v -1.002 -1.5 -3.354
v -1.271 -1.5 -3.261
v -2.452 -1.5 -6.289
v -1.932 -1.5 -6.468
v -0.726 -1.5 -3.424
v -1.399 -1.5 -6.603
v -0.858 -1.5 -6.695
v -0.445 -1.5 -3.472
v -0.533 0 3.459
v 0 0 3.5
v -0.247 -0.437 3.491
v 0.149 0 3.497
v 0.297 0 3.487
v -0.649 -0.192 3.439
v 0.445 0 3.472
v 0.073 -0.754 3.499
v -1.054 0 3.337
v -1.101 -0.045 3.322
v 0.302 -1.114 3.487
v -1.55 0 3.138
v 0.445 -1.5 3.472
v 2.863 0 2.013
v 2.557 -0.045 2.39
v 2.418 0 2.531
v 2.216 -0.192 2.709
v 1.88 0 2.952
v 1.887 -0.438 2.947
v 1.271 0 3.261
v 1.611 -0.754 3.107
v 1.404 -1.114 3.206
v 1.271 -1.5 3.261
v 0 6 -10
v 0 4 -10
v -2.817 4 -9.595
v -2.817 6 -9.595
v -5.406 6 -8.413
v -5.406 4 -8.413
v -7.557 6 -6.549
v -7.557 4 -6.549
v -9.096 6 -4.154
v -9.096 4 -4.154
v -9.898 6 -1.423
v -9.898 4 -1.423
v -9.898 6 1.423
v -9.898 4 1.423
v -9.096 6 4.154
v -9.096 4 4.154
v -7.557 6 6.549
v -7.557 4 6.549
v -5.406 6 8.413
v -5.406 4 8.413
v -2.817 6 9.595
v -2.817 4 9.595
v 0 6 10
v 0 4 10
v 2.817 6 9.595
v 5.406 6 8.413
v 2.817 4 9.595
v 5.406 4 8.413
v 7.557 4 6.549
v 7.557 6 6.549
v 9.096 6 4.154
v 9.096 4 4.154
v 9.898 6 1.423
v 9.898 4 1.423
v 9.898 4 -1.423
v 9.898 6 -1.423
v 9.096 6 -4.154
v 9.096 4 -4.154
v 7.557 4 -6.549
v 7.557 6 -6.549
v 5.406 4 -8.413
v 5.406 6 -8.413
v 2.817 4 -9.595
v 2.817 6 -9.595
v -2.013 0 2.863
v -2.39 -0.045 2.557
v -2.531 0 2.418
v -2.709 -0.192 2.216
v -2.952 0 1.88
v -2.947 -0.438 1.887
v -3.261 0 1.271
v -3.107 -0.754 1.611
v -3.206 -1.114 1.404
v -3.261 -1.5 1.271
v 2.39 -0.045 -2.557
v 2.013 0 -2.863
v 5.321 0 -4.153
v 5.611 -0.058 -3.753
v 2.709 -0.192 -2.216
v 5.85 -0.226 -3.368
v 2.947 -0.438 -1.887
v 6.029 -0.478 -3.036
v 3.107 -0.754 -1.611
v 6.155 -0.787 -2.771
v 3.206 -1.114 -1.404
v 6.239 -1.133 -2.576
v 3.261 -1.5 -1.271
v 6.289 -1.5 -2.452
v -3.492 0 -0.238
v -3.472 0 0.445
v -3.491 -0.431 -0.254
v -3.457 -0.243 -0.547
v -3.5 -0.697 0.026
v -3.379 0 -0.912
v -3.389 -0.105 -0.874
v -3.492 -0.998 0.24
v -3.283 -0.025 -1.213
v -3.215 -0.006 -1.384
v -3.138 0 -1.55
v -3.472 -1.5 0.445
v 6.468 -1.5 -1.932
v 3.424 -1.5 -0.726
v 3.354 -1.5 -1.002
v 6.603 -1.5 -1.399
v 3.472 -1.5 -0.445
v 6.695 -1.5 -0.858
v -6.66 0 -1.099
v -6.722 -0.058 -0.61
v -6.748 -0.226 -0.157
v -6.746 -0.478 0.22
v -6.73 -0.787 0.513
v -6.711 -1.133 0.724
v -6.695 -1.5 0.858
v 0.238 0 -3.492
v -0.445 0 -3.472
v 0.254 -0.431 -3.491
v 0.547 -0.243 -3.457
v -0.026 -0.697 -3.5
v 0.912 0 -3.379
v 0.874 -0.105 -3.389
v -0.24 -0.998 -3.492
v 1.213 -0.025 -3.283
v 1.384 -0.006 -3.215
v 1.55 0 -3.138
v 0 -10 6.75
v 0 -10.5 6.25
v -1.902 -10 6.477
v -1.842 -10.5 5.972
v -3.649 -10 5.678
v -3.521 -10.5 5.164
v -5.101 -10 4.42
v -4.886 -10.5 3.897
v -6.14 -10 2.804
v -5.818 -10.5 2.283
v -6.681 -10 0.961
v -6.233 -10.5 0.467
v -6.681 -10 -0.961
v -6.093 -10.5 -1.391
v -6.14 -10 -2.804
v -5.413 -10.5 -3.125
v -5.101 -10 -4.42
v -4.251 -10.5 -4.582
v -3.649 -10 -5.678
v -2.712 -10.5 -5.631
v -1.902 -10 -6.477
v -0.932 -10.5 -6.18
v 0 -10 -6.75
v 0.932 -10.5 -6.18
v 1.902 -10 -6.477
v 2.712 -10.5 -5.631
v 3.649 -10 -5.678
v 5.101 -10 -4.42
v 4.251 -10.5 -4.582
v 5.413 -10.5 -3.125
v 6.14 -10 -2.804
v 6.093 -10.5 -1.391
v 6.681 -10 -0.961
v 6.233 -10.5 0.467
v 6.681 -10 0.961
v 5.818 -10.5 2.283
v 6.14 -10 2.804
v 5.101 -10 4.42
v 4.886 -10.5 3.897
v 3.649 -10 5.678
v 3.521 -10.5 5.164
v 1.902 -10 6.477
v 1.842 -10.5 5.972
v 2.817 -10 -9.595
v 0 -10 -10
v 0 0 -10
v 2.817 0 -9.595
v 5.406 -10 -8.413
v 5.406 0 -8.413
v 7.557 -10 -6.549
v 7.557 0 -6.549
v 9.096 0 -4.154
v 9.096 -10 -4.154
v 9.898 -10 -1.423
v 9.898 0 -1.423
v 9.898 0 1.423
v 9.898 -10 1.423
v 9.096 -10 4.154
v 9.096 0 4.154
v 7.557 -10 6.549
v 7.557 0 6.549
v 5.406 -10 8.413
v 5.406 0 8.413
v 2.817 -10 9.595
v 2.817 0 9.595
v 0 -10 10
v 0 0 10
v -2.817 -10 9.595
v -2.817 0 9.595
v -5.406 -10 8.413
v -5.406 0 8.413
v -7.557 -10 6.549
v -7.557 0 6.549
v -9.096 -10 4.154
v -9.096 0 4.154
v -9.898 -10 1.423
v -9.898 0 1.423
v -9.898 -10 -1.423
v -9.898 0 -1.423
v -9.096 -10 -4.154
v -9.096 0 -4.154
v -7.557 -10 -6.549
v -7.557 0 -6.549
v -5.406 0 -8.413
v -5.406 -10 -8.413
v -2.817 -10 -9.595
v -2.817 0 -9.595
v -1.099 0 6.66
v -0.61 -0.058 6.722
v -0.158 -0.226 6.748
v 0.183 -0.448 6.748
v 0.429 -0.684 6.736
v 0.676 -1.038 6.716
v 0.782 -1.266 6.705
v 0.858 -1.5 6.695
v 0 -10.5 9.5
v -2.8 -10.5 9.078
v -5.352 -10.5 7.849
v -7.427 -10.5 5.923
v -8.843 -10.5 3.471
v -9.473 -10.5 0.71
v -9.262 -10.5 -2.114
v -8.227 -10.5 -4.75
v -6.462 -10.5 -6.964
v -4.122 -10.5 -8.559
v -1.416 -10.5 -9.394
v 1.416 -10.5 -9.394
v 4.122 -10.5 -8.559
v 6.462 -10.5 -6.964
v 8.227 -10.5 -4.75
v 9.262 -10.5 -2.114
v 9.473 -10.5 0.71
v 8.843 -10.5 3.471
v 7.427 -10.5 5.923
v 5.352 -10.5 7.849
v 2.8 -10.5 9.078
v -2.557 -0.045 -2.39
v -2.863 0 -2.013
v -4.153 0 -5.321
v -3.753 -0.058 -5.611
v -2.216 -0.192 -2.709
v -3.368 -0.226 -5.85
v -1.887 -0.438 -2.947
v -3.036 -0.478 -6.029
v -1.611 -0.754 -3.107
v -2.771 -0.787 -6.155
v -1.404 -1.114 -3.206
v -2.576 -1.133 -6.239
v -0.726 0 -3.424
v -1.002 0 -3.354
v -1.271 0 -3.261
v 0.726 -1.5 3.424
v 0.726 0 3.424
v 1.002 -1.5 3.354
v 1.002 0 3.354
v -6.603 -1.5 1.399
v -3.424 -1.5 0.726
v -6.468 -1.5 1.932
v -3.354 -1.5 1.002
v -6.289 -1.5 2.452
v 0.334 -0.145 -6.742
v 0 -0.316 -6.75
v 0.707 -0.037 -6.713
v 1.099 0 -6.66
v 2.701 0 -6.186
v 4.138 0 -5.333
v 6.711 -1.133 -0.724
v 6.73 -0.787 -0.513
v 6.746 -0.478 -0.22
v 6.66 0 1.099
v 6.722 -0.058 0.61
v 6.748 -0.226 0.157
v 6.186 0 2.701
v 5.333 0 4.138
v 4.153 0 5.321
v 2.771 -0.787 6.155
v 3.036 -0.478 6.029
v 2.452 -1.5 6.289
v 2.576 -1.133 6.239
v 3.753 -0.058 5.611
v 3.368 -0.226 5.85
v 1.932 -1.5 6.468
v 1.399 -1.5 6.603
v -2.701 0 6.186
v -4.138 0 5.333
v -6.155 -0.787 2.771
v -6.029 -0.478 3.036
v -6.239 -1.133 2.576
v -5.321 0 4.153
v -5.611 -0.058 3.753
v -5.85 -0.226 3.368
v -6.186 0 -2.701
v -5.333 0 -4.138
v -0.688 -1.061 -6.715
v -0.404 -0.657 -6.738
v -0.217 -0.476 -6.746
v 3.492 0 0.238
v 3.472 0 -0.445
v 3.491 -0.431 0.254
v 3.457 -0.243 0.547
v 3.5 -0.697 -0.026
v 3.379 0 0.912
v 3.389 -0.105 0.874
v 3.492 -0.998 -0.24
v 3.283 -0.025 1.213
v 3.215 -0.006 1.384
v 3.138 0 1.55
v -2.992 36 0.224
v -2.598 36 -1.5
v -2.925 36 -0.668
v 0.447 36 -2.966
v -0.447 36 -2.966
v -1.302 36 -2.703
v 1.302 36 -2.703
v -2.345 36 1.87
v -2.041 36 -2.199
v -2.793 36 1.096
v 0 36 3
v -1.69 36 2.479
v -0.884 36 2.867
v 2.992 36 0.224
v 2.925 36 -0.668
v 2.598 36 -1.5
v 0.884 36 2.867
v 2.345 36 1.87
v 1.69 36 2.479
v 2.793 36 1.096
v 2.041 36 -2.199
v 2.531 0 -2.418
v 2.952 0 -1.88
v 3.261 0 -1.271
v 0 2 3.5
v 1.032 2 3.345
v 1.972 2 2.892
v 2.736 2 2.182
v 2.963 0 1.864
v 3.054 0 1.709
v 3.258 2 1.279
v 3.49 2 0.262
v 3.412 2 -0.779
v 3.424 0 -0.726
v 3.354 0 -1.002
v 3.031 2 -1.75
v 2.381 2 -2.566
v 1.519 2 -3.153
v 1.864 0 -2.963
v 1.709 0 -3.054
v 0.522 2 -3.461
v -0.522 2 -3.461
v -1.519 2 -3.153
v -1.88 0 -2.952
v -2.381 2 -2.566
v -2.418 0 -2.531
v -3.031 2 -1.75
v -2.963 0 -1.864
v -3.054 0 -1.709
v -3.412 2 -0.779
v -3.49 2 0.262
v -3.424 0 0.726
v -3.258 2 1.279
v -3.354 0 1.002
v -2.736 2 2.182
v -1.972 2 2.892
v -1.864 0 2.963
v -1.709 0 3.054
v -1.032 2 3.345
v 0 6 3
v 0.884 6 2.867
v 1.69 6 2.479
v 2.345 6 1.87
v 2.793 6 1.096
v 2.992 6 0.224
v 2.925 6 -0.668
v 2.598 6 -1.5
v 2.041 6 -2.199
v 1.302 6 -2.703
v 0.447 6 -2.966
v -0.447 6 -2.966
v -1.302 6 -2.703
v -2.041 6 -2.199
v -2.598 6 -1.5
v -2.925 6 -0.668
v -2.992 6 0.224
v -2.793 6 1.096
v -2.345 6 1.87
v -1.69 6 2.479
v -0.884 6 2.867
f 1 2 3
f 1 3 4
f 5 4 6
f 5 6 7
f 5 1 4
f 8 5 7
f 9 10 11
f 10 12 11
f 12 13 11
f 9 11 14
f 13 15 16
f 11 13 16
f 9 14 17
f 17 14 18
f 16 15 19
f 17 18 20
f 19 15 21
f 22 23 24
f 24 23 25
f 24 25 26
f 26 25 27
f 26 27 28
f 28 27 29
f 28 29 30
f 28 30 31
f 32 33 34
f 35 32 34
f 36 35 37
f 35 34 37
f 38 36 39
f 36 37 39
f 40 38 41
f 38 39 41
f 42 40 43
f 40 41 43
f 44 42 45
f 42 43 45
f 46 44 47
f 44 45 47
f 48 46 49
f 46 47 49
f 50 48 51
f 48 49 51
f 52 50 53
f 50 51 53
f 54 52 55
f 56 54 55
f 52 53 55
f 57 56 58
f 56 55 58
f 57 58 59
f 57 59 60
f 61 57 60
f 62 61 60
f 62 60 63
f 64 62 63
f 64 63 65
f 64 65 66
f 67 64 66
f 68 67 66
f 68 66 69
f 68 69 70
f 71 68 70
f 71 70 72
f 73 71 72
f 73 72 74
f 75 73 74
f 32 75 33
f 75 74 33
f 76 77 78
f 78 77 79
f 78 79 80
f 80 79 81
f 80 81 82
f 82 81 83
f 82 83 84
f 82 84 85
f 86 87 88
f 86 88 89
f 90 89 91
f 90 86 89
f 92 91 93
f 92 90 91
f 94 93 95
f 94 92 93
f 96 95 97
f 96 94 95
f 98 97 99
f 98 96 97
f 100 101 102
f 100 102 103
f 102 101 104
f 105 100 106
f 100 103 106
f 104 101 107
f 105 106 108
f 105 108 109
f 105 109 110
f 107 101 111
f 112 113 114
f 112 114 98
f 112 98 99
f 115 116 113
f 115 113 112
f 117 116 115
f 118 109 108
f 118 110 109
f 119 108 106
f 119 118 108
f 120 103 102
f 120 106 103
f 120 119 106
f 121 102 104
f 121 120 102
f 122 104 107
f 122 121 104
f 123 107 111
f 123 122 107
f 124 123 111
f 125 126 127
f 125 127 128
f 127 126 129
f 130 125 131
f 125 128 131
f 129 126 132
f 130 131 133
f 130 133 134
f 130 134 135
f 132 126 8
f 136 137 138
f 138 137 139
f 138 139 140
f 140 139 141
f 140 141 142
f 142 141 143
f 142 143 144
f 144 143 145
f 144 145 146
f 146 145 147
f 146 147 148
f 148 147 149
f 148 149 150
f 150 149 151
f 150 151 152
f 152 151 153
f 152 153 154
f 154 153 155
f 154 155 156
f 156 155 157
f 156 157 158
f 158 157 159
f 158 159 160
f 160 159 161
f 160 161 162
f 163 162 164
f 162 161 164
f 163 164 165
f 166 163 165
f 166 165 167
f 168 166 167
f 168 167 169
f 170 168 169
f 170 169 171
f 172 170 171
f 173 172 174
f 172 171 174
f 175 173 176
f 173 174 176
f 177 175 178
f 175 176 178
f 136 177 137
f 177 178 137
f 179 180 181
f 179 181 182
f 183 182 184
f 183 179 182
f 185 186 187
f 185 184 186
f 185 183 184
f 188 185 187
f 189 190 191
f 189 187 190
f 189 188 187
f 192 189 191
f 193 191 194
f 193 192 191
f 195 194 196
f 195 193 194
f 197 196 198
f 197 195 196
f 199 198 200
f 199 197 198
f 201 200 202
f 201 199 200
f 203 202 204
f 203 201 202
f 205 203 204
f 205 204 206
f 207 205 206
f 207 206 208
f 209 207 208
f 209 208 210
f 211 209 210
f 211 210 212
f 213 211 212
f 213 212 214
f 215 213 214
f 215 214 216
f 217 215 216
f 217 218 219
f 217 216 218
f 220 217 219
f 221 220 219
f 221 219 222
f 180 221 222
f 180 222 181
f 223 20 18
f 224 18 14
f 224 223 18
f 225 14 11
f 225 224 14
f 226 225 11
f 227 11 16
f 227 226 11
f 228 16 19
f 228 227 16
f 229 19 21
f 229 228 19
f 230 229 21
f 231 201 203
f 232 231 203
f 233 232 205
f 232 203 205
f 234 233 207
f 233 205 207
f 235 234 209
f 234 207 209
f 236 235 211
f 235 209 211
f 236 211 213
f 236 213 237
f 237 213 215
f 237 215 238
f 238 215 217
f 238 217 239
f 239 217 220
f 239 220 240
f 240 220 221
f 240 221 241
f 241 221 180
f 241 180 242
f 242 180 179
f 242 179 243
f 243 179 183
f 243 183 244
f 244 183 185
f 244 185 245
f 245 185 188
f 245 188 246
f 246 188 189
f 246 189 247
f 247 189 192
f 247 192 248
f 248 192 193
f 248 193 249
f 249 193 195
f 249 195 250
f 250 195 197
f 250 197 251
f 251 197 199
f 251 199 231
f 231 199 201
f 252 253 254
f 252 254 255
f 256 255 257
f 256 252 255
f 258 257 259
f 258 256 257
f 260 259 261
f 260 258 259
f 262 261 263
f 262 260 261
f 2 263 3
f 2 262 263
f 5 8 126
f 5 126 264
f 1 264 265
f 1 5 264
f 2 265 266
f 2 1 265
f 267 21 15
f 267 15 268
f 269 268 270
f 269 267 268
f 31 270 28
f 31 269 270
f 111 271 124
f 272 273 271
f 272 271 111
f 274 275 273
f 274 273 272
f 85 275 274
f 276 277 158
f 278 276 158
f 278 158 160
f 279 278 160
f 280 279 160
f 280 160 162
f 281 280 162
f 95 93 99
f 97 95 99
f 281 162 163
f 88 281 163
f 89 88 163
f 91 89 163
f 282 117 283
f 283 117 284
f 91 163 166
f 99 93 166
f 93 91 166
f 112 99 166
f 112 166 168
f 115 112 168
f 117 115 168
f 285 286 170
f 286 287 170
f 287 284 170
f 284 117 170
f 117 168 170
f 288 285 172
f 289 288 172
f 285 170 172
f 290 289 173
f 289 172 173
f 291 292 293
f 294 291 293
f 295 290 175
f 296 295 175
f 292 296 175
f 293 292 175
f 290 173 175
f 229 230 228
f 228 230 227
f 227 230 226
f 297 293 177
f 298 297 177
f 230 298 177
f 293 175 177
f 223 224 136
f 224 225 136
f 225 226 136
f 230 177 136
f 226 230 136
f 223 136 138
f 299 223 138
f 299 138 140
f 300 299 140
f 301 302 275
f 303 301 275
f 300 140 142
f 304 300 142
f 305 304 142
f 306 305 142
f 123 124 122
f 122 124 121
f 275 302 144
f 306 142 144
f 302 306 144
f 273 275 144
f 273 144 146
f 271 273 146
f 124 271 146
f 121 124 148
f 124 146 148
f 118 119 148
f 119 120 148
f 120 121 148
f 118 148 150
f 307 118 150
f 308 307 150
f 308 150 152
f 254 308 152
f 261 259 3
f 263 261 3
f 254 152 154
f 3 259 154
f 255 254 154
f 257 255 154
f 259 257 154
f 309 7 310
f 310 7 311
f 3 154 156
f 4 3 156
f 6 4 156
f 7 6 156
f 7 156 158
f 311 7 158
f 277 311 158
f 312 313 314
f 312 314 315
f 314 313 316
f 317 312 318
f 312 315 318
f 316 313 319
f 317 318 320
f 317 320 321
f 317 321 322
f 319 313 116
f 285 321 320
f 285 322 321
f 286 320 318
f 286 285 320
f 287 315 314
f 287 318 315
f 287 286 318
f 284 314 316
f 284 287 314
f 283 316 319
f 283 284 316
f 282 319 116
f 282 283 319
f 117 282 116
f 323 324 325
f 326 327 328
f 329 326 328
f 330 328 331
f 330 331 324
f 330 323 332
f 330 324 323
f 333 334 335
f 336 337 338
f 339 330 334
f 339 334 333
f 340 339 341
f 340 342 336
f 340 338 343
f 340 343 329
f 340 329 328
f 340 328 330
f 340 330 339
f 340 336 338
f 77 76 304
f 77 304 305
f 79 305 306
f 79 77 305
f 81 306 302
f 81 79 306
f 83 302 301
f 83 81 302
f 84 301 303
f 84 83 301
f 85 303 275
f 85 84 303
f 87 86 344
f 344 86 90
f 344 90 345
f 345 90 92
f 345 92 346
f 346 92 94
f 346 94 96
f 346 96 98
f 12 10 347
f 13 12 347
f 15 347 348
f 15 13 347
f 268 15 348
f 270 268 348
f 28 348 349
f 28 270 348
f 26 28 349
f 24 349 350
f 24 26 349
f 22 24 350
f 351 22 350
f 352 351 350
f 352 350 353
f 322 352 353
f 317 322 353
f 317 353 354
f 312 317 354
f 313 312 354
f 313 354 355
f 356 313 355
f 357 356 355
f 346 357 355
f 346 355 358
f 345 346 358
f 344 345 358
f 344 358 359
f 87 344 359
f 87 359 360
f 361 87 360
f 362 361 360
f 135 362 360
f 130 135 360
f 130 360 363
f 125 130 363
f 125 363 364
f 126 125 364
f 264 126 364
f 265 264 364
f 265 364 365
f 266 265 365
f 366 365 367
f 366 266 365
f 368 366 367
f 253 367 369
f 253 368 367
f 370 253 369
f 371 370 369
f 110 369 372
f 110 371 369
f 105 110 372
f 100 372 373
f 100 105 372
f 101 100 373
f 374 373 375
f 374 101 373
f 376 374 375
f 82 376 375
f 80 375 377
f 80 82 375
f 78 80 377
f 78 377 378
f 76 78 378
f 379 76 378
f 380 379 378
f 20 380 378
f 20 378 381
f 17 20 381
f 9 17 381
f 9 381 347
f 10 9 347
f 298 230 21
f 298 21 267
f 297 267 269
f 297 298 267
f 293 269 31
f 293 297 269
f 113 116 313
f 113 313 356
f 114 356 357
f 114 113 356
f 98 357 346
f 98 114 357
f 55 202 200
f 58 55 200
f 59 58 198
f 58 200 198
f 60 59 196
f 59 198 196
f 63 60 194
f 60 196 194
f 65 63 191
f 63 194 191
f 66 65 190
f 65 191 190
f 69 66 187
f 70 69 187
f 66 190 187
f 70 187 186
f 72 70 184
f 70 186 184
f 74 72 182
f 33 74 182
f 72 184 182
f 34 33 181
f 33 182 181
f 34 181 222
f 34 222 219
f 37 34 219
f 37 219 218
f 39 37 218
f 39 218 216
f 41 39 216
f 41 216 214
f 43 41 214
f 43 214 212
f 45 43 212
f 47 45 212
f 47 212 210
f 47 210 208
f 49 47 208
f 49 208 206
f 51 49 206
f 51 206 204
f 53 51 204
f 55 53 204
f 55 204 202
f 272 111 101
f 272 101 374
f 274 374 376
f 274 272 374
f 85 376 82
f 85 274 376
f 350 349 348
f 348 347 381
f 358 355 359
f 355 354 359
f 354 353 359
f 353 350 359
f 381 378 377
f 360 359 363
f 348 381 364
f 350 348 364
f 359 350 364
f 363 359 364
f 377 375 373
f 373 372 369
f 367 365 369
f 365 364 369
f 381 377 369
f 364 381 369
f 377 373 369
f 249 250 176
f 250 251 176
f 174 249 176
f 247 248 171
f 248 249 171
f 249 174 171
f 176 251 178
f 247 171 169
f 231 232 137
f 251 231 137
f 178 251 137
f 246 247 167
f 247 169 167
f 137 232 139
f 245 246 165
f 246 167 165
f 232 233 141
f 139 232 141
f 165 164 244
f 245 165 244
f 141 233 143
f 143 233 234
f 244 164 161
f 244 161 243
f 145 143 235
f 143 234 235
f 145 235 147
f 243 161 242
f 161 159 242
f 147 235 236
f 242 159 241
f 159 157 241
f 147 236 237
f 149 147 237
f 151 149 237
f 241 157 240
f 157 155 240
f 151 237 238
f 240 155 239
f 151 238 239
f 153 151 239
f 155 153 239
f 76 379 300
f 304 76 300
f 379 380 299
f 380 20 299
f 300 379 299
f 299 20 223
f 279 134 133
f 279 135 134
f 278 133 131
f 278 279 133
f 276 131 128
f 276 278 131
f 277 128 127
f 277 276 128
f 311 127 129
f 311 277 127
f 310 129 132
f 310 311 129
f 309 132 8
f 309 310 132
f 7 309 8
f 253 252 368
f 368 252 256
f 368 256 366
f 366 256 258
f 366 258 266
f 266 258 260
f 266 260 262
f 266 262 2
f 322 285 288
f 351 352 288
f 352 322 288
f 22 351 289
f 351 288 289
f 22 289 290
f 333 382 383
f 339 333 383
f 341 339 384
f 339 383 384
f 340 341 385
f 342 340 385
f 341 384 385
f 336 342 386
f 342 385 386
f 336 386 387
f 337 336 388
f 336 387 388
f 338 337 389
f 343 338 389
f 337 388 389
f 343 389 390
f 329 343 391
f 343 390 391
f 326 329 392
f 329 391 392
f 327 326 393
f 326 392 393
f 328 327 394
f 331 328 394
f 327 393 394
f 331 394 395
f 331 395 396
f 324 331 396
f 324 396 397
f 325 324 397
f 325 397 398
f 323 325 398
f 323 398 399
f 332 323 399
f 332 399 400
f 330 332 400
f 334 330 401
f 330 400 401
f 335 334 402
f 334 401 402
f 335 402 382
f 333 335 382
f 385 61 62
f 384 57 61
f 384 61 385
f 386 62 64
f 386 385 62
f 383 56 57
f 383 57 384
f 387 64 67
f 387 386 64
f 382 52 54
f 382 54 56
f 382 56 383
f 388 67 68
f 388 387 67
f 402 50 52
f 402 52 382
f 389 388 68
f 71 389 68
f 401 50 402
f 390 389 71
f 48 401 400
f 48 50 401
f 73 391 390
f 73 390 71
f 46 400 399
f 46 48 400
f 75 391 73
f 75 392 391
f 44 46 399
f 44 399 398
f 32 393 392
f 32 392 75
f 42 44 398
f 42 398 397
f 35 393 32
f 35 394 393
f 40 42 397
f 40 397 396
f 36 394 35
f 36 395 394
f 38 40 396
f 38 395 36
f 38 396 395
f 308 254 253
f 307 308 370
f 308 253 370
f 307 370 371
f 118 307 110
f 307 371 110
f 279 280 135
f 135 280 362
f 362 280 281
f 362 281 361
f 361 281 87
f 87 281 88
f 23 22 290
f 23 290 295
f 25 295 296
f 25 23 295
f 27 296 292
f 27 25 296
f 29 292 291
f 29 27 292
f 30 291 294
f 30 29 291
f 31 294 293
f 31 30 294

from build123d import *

# Parameters (mm, degrees)
ESQUISSE1_R        = 10
ESQUISSE1_R_2      = 3.5
BOSS_EXTRU_1_DEPTH = 4
BOSS_EXTRU_2_START = 10
ESQUISSE2_R        = 10
ESQUISSE2_R_2      = 6.75
BOSS_EXTRU_2_DEPTH = 10
BOSS_EXTRU_3_START = 1.5
BOSS_EXTRU_3_DEPTH = 1.5
CONG_1_R           = 2
BOSS_EXTRU_6_START = -2
ESQUISSE13_R       = 3.5
BOSS_EXTRU_6_DEPTH = 2
ESQUISSE15_R       = 10
BOSS_EXTRU_7_DEPTH = 2
ESQUISSE21_R       = 3
BOSS_EXTRU_8_DEPTH = 30


with BuildPart() as part:
    # Esquisse1 → Boss.-Extru.1 (new body)
    with BuildSketch(Plane(origin=(0, 0, 0), x_dir=(1, 0, 0), z_dir=(0, 1, 0))):
        with Locations(Location((0, 0, 0), (0, 0, 270))):
            Circle(ESQUISSE1_R)
        with Locations(Location((0, 0, 0), (0, 0, 270))):
            Circle(ESQUISSE1_R_2, mode=Mode.SUBTRACT)
    extrude(amount=BOSS_EXTRU_1_DEPTH)

    # Esquisse2 → Boss.-Extru.2 (add)
    with BuildSketch(Plane.XZ.offset(BOSS_EXTRU_2_START)):
        with Locations(Location((0, 0, 0), (0, 0, 270))):
            Circle(ESQUISSE2_R)
        with Locations(Location((0, 0, 0), (0, 0, 270))):
            Circle(ESQUISSE2_R_2, mode=Mode.SUBTRACT)
    extrude(amount=-BOSS_EXTRU_2_DEPTH)

    # Esquisse5 → Révolution2 (revolve)
    with BuildSketch(Plane(origin=(0, 0, 0), x_dir=(0, 0, -1), z_dir=(1, 0, 0))):
        Polygon((-10, -10), (-6.75, -10), (-6.250000000000001, -10.499999999999995), (-9.500000000000004, -10.499999999999993), align=None)
    revolve(axis=Axis((0, 0, 0), (0, -1, 0)))

    # Esquisse7 → Boss.-Extru.3 (add)
    with BuildSketch(Plane.XZ.offset(BOSS_EXTRU_3_START)):
        with BuildLine():
            ThreePointArc((-3.471641565041511, 0.4446401285040917), (-3.3915764747476542, 0.8644125264815606), (-3.260950790974577, 1.2712985246755686))
            Line((-3.260950790974577, 1.2712985246755686), (-6.288976525451004, 2.4517900118742246))
            ThreePointArc((-6.288976525451004, 2.4517900118742246), (-6.54089748701339, 1.6670813010714052), (-6.695308732580065, 0.8575202478290395))
            Line((-6.695308732580065, 0.8575202478290395), (-3.471641565041511, 0.4446401285040917))
        make_face()
        with BuildLine():
            ThreePointArc((-0.44464012850385526, -3.47164156504154), (-0.8644125264814398, -3.3915764747476906), (-1.2712985246755584, -3.2609507909745816))
            Line((-1.271298524675558, -3.2609507909745803), (-2.4517900118740936, -6.288976525450949))
            ThreePointArc((-2.4517900118740936, -6.28897652545095), (-1.6670813010712728, -6.54089748701333), (-0.8575202478289087, -6.69530873258001))
            Line((-0.8575202478289086, -6.695308732580009), (-0.4446401285038535, -3.4716415650415393))
        make_face()
        with BuildLine():
            ThreePointArc((3.4716415650415344, -0.44464012850390167), (3.391576474747708, -0.8644125264813738), (3.2609507909746505, -1.271298524675382))
            Line((3.2609507909746522, -1.2712985246753834), (6.288976525451078, -2.4517900118740386))
            ThreePointArc((6.288976525451079, -2.451790011874039), (6.540897487013439, -1.6670813010712129), (6.69530873258014, -0.8575202478288542))
            Line((6.6953087325801395, -0.8575202478288538), (3.471641565041585, -0.4446401285039065))
        make_face()
        with BuildLine():
            Line((0.857520247828984, 6.6953087325801945), (0.44464012850403645, 3.4716415650416406))
            ThreePointArc((0.44464012850402057, 3.4716415650415193), (0.8644125264815102, 3.391576474747673), (1.2712985246755357, 3.2609507909745905))
            Line((1.2712985246755355, 3.26095079097459), (2.4517900118741687, 6.288976525451134))
            ThreePointArc((2.4517900118741687, 6.288976525451133), (1.6670813010713434, 6.540897487013499), (0.857520247828984, 6.6953087325801945))
        make_face()
    extrude(amount=-BOSS_EXTRU_3_DEPTH)

    # Congé1
    # the kernel refuses this fillet: 2 mm, written as the material it adds along each edge
    with BuildSketch(Plane(origin=(-11.497312291654126, 0, 1.472550180954296), x_dir=(-0.1270400367153696, 0, -0.9918975900118709), z_dir=(0.9918975900118709, 0, -0.1270400367153696))) as cong_1_piece_1_section:
        with BuildLine():
            CenterArc((1.9364916731037083, -2), CONG_1_R, 90, 75.5224878140701)
            Line((-2.2e-16, -1.5), (0, 0))
            Line((0, 0), (1.9364916731037083, 0))
        make_face()
    cong_1_piece_1 = extrude(amount=12.932458365518517, mode=Mode.PRIVATE)
    cong_1_piece_1 = cong_1_piece_1 - Plane(origin=(0, 0, 0), x_dir=(-1.8e-16, 0, 1), z_dir=(0, -1, 0)) * Cylinder(3.5, 34, mode=Mode.PRIVATE)
    cong_1_piece_1 = cong_1_piece_1 & Plane(origin=(0, 0, 0), x_dir=(-1.8e-16, 0, -1), z_dir=(0, -1, 0)) * Cylinder(6.75, 34, mode=Mode.PRIVATE)
    add(cong_1_piece_1)
    with BuildSketch(Plane(origin=(1.2496235326849163, 0, -0.4871721946552088), x_dir=(0.3632281499072788, 0, 0.9317002259927467), z_dir=(-0.9317002259927468, 0, 0.3632281499072788))) as cong_1_piece_2_section:
        with BuildLine():
            CenterArc((1.9364916731037085, -2), CONG_1_R, 90, 75.5224878140701)
            Line((0, -1.5), (0, 0))
            Line((0, 0), (1.9364916731037085, 0))
        make_face()
    cong_1_piece_2 = extrude(amount=12.932458365518542, mode=Mode.PRIVATE)
    cong_1_piece_2 = cong_1_piece_2 - Plane(origin=(0, 0, 0), x_dir=(-1.8e-16, 0, 1), z_dir=(0, -1, 0)) * Cylinder(3.5, 34, mode=Mode.PRIVATE)
    cong_1_piece_2 = cong_1_piece_2 & Plane(origin=(0, 0, 0), x_dir=(-1.8e-16, 0, -1), z_dir=(0, -1, 0)) * Cylinder(6.75, 34, mode=Mode.PRIVATE)
    add(cong_1_piece_2)
    with BuildSketch(Plane(origin=(-1.4725501809543382, 0, -11.497312291654048), x_dir=(0.9918975900118664, 0, -0.12704003671540534), z_dir=(0.12704003671540534, 0, 0.9918975900118664))) as cong_1_piece_3_section:
        with BuildLine():
            CenterArc((1.9364916731037087, -2.0000000000000004), CONG_1_R, 90, 75.5224878140701)
            Line((0, -1.5000000000000004), (0, 0))
            Line((0, 0), (1.9364916731037087, 0))
        make_face()
    cong_1_piece_3 = extrude(amount=12.932458365518444, mode=Mode.PRIVATE)
    cong_1_piece_3 = cong_1_piece_3 - Plane(origin=(0, 0, 0), x_dir=(-1.8e-16, 0, 1), z_dir=(0, -1, 0)) * Cylinder(3.5, 34, mode=Mode.PRIVATE)
    cong_1_piece_3 = cong_1_piece_3 & Plane(origin=(0, 0, 0), x_dir=(-1.8e-16, 0, -1), z_dir=(0, -1, 0)) * Cylinder(6.75, 34, mode=Mode.PRIVATE)
    add(cong_1_piece_3)
    with BuildSketch(Plane(origin=(0.4871721946550931, 0, 1.2496235326849625), x_dir=(-0.9317002259927569, 0, 0.3632281499072527), z_dir=(-0.3632281499072527, 0, -0.931700225992757))) as cong_1_piece_4_section:
        with BuildLine():
            CenterArc((1.9364916731037085, -2), CONG_1_R, 90, 75.5224878140701)
            Line((0, -1.5), (0, 0))
            Line((0, 0), (1.9364916731037085, 0))
        make_face()
    cong_1_piece_4 = extrude(amount=12.932458365518446, mode=Mode.PRIVATE)
    cong_1_piece_4 = cong_1_piece_4 - Plane(origin=(0, 0, 0), x_dir=(-1.8e-16, 0, 1), z_dir=(0, -1, 0)) * Cylinder(3.5, 34, mode=Mode.PRIVATE)
    cong_1_piece_4 = cong_1_piece_4 & Plane(origin=(0, 0, 0), x_dir=(-1.8e-16, 0, -1), z_dir=(0, -1, 0)) * Cylinder(6.75, 34, mode=Mode.PRIVATE)
    add(cong_1_piece_4)
    with BuildSketch(Plane(origin=(11.4973122916542, 0, -1.4725501809541097), x_dir=(0.12704003671536943, 0, 0.9918975900118709), z_dir=(-0.991897590011871, 0, 0.12704003671536945))) as cong_1_piece_5_section:
        with BuildLine():
            CenterArc((1.9364916731037083, -2.0000000000000004), CONG_1_R, 90, 75.5224878140701)
            Line((-2.2e-16, -1.5000000000000004), (0, 0))
            Line((0, 0), (1.9364916731037083, 0))
        make_face()
    cong_1_piece_5 = extrude(amount=12.932458365518519, mode=Mode.PRIVATE)
    cong_1_piece_5 = cong_1_piece_5 - Plane(origin=(0, 0, 0), x_dir=(-1.8e-16, 0, 1), z_dir=(0, -1, 0)) * Cylinder(3.5, 34, mode=Mode.PRIVATE)
    cong_1_piece_5 = cong_1_piece_5 & Plane(origin=(0, 0, 0), x_dir=(-1.8e-16, 0, -1), z_dir=(0, -1, 0)) * Cylinder(6.75, 34, mode=Mode.PRIVATE)
    add(cong_1_piece_5)
    with BuildSketch(Plane(origin=(-1.2496235326848435, 0, 0.4871721946553944), x_dir=(-0.3632281499072787, 0, -0.9317002259927468), z_dir=(0.9317002259927469, 0, -0.3632281499072787))) as cong_1_piece_6_section:
        with BuildLine():
            CenterArc((1.936491673103709, -2), CONG_1_R, 90, 75.5224878140701)
            Line((2.1e-16, -1.5), (0, 0))
            Line((0, 0), (1.936491673103709, 0))
        make_face()
    cong_1_piece_6 = extrude(amount=12.932458365518547, mode=Mode.PRIVATE)
    cong_1_piece_6 = cong_1_piece_6 - Plane(origin=(0, 0, 0), x_dir=(-1.8e-16, 0, 1), z_dir=(0, -1, 0)) * Cylinder(3.5, 34, mode=Mode.PRIVATE)
    cong_1_piece_6 = cong_1_piece_6 & Plane(origin=(0, 0, 0), x_dir=(-1.8e-16, 0, -1), z_dir=(0, -1, 0)) * Cylinder(6.75, 34, mode=Mode.PRIVATE)
    add(cong_1_piece_6)
    with BuildSketch(Plane(origin=(1.4725501809542403, 0, 11.497312291654257), x_dir=(-0.9918975900118709, 0, 0.1270400367153695), z_dir=(-0.1270400367153695, 0, -0.9918975900118709))) as cong_1_piece_7_section:
        with BuildLine():
            CenterArc((1.936491673103709, -2), CONG_1_R, 90, 75.5224878140701)
            Line((2.2e-16, -1.5), (0, 0))
            Line((0, 0), (1.936491673103709, 0))
        make_face()
    cong_1_piece_7 = extrude(amount=12.93245836551852, mode=Mode.PRIVATE)
    cong_1_piece_7 = cong_1_piece_7 - Plane(origin=(0, 0, 0), x_dir=(-1.8e-16, 0, 1), z_dir=(0, -1, 0)) * Cylinder(3.5, 34, mode=Mode.PRIVATE)
    cong_1_piece_7 = cong_1_piece_7 & Plane(origin=(0, 0, 0), x_dir=(-1.8e-16, 0, -1), z_dir=(0, -1, 0)) * Cylinder(6.75, 34, mode=Mode.PRIVATE)
    add(cong_1_piece_7)
    with BuildSketch(Plane(origin=(-0.4871721946551535, 0, -1.2496235326849385), x_dir=(0.9317002259927538, 0, -0.3632281499072605), z_dir=(0.36322814990726054, 0, 0.931700225992754))) as cong_1_piece_8_section:
        with BuildLine():
            CenterArc((1.9364916731037085, -2), CONG_1_R, 90, 75.5224878140701)
            Line((0, -1.5), (0, 0))
            Line((0, 0), (1.9364916731037085, 0))
        make_face()
    cong_1_piece_8 = extrude(amount=12.932458365518647, mode=Mode.PRIVATE)
    cong_1_piece_8 = cong_1_piece_8 - Plane(origin=(0, 0, 0), x_dir=(-1.8e-16, 0, 1), z_dir=(0, -1, 0)) * Cylinder(3.5, 34, mode=Mode.PRIVATE)
    cong_1_piece_8 = cong_1_piece_8 & Plane(origin=(0, 0, 0), x_dir=(-1.8e-16, 0, -1), z_dir=(0, -1, 0)) * Cylinder(6.75, 34, mode=Mode.PRIVATE)
    add(cong_1_piece_8)

    # Esquisse13 → Boss.-Extru.6 (add)
    with BuildSketch(Plane(origin=(0, 4, 0), x_dir=(1, 0, 0), z_dir=(0, 1, 0)).offset(BOSS_EXTRU_6_START)):
        with Locations(Location((0, 0, 0), (0, 0, 97.298580632))):
            Circle(ESQUISSE13_R)
    extrude(amount=BOSS_EXTRU_6_DEPTH)

    # Esquisse15 → Boss.-Extru.7 (add)
    with BuildSketch(Plane(origin=(0, 4, 0), x_dir=(1, 0, 0), z_dir=(0, 1, 0))):
        with Locations(Location((0, 0, 0), (0, 0, 90))):
            Circle(ESQUISSE15_R)
    extrude(amount=BOSS_EXTRU_7_DEPTH)

    # Esquisse21 → Boss.-Extru.8 (add)
    with BuildSketch(Plane(origin=(0, 6, 0), x_dir=(1, 0, 0), z_dir=(0, 1, 0))):
        with Locations(Location((0, 0, 0), (0, 0, 270))):
            Circle(ESQUISSE21_R)
    extrude(amount=BOSS_EXTRU_8_DEPTH)


solid = part.part
